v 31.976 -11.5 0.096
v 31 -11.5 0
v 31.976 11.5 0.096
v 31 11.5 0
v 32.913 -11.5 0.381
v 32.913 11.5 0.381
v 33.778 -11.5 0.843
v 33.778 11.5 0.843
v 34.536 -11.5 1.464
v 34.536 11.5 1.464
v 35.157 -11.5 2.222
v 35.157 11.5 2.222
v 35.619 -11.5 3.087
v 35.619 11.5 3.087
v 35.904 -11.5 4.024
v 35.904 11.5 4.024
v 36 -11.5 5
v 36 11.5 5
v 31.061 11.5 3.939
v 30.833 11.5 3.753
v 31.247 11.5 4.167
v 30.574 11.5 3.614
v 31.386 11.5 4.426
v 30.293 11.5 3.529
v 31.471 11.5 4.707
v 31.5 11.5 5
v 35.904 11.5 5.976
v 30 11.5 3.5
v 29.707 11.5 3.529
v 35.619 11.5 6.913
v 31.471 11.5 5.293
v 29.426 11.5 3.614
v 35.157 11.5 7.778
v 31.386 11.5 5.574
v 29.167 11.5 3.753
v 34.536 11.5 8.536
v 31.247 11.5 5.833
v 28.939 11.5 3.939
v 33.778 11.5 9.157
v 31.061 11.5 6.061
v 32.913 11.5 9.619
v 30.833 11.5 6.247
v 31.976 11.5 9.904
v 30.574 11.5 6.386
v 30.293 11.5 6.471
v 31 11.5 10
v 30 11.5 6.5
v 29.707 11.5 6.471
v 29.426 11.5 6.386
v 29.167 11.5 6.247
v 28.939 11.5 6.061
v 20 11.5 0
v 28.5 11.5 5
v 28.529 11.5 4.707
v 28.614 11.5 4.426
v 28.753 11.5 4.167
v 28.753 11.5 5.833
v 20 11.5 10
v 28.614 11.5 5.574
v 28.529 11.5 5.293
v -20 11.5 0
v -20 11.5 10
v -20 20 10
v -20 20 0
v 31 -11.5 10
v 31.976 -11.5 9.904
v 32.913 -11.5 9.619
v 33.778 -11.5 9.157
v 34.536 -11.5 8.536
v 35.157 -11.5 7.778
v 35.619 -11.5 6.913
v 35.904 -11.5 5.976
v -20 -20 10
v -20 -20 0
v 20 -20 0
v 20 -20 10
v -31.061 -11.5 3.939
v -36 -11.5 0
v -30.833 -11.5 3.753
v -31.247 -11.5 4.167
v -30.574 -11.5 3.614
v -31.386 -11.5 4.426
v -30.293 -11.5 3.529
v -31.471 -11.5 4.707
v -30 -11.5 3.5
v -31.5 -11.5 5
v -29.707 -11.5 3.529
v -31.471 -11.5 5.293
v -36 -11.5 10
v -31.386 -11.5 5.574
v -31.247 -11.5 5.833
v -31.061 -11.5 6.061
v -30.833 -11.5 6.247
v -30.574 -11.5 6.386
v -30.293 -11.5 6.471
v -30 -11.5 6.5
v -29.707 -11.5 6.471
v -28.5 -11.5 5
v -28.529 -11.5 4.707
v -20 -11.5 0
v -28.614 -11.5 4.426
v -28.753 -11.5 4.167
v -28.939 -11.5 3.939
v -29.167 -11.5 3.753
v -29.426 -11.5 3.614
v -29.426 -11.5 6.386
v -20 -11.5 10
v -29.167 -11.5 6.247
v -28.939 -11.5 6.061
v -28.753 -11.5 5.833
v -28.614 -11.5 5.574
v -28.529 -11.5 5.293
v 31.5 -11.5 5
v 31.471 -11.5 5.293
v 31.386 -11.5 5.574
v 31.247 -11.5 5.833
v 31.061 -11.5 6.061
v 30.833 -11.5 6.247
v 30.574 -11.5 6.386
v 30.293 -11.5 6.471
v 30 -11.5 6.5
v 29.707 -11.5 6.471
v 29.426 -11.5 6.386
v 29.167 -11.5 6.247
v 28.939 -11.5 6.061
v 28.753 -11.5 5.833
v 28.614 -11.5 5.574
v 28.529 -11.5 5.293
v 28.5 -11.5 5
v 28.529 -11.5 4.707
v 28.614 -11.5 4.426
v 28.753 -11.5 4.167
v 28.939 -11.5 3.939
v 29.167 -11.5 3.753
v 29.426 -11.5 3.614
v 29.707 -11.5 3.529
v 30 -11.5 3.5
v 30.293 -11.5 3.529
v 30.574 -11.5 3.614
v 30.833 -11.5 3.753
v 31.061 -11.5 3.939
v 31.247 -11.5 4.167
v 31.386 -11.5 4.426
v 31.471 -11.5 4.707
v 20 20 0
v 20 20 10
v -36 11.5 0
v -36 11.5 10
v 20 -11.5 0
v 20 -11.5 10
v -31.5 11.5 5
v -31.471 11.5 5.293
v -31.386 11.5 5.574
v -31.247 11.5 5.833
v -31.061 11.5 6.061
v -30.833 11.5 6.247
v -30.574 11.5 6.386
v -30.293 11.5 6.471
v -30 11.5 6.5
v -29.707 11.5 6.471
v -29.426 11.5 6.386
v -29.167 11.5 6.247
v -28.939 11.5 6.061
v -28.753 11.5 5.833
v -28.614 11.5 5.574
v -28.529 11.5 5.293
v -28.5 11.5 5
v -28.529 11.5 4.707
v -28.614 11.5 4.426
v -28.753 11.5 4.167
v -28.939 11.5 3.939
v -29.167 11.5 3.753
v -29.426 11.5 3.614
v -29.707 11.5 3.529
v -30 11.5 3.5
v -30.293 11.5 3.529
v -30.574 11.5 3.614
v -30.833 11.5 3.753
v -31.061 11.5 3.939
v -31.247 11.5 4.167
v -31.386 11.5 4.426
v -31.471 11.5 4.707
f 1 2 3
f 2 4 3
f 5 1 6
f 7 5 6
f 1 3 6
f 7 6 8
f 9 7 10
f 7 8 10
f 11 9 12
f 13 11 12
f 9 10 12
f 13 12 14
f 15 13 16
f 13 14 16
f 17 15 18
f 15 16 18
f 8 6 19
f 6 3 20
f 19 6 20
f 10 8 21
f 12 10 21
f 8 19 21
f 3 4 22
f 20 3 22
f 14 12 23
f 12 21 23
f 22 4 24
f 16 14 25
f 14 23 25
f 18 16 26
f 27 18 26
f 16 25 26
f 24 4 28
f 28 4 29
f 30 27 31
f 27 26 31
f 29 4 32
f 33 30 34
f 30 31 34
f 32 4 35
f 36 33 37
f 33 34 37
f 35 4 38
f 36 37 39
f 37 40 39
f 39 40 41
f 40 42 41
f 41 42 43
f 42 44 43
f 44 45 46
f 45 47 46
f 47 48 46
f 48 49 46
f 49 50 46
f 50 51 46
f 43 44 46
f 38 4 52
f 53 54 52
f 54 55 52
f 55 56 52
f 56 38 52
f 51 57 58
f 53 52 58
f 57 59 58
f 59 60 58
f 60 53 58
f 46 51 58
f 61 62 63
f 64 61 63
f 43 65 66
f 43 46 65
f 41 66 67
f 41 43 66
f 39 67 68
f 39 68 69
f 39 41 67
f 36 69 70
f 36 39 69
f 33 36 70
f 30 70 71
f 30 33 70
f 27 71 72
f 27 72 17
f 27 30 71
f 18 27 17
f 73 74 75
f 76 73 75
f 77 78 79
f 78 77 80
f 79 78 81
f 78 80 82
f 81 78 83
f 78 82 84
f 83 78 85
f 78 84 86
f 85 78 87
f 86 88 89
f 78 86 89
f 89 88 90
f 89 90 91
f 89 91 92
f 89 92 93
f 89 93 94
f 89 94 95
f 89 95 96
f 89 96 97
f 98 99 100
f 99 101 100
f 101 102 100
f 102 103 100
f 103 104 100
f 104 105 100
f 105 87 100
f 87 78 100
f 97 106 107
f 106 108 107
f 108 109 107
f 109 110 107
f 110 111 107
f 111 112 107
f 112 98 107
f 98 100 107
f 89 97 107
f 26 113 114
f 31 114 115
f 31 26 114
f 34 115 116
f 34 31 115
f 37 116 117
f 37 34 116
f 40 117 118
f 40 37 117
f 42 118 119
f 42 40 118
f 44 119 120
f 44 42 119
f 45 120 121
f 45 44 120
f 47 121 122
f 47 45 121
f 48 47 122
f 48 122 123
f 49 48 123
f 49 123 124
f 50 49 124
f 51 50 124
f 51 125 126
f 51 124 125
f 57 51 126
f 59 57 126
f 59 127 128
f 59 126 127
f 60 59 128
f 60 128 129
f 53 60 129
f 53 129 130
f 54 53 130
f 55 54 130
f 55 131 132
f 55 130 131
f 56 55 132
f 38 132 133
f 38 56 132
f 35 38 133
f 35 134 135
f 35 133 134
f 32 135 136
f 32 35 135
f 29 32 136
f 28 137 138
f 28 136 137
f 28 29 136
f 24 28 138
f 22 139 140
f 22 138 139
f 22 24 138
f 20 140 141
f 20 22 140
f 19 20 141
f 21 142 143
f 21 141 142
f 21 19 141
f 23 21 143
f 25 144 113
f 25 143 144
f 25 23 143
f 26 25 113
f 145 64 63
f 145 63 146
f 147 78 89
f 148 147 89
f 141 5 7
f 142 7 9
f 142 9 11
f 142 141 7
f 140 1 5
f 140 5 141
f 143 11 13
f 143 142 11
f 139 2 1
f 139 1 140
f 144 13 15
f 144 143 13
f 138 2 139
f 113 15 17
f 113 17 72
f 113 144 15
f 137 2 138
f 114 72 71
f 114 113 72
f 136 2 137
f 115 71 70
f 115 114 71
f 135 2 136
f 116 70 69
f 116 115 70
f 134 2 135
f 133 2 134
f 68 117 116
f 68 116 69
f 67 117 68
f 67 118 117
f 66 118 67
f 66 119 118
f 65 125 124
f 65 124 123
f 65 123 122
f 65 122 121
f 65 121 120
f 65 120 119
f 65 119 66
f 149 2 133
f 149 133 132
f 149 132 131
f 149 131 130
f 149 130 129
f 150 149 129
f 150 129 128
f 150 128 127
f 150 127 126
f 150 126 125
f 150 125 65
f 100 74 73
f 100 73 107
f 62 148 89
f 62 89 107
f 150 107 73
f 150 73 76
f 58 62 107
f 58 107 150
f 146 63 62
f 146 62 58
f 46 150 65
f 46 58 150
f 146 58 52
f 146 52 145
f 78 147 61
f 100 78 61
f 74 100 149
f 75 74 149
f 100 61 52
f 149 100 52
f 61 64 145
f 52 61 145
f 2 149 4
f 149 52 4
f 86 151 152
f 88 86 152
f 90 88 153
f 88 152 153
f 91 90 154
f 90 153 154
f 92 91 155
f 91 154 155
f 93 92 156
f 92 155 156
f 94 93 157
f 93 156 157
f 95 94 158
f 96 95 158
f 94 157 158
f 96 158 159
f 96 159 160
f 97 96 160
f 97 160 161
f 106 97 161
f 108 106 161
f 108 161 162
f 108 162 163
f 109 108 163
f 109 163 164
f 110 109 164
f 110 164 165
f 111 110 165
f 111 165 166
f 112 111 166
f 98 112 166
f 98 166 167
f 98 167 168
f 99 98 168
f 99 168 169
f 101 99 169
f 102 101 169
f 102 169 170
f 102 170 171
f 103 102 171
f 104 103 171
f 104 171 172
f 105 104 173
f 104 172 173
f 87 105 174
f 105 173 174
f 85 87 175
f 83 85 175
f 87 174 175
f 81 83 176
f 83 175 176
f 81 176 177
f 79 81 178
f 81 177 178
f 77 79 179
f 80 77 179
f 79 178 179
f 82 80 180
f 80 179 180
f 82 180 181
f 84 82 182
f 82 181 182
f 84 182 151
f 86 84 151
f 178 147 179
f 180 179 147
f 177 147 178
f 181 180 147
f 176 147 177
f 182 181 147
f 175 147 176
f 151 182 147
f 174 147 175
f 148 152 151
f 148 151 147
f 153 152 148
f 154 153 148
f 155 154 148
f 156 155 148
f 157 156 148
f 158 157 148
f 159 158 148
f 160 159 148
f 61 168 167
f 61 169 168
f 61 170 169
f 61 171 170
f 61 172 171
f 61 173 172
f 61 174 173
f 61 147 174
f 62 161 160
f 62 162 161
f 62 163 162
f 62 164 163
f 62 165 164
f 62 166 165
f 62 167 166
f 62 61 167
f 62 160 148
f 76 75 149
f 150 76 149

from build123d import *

# Parameters (mm, degrees)
SKETCH_1_W          = 40
SKETCH_1_H          = 40
EXTRUDE_1_DEPTH     = 10
SKETCH_2_W          = 10
SKETCH_2_H          = 23
EXTRUDE_2_DEPTH     = 16
SKETCH_3_R          = 1.5
CUT_EXTRUDE_1_DEPTH = 30
FILLET_2_R          = 5


with BuildPart() as part:
    # 草图1 → 凸台-拉伸1 (new body)
    with BuildSketch(Plane.XY):
        Rectangle(SKETCH_1_W, SKETCH_1_H)
    extrude(amount=EXTRUDE_1_DEPTH)

    # 草图2 → 凸台-拉伸2 (add)
    with BuildSketch(Plane.ZY.offset(20)):
        with Locations((5, 0)):
            Rectangle(SKETCH_2_W, SKETCH_2_H)
    extrude_2 = extrude(amount=EXTRUDE_2_DEPTH)

    # 草图3 → 切除-拉伸1 (cut)
    with BuildSketch(Plane(origin=(0, 11.5, 0), x_dir=(1, 0, 0), z_dir=(0, 1, 0))):
        with Locations(Location((-30, -5, 0), (0, 0, 180))):
            Circle(SKETCH_3_R)
    cut_extrude_1 = extrude(amount=-CUT_EXTRUDE_1_DEPTH, mode=Mode.SUBTRACT)

    # 镜向1: 凸台-拉伸2, 切除-拉伸1 across plane
    add(extrude_2.mirror(Plane(origin=(0, 0, 0), x_dir=(0, 0, 1), z_dir=(1, 0, 0))))
    add(cut_extrude_1.mirror(Plane(origin=(0, 0, 0), x_dir=(0, 0, 1), z_dir=(1, 0, 0))), mode=Mode.SUBTRACT)

    # 圆角2
    fillet_2_edges = [part.edges().sort_by_distance(p)[0] for p in [
        (36, 0, 0),
        (36, 0, 10),
    ]]
    fillet(fillet_2_edges, radius=FILLET_2_R - 0.0001)  # a hair under: the kernel refuses the full size


solid = part.part
